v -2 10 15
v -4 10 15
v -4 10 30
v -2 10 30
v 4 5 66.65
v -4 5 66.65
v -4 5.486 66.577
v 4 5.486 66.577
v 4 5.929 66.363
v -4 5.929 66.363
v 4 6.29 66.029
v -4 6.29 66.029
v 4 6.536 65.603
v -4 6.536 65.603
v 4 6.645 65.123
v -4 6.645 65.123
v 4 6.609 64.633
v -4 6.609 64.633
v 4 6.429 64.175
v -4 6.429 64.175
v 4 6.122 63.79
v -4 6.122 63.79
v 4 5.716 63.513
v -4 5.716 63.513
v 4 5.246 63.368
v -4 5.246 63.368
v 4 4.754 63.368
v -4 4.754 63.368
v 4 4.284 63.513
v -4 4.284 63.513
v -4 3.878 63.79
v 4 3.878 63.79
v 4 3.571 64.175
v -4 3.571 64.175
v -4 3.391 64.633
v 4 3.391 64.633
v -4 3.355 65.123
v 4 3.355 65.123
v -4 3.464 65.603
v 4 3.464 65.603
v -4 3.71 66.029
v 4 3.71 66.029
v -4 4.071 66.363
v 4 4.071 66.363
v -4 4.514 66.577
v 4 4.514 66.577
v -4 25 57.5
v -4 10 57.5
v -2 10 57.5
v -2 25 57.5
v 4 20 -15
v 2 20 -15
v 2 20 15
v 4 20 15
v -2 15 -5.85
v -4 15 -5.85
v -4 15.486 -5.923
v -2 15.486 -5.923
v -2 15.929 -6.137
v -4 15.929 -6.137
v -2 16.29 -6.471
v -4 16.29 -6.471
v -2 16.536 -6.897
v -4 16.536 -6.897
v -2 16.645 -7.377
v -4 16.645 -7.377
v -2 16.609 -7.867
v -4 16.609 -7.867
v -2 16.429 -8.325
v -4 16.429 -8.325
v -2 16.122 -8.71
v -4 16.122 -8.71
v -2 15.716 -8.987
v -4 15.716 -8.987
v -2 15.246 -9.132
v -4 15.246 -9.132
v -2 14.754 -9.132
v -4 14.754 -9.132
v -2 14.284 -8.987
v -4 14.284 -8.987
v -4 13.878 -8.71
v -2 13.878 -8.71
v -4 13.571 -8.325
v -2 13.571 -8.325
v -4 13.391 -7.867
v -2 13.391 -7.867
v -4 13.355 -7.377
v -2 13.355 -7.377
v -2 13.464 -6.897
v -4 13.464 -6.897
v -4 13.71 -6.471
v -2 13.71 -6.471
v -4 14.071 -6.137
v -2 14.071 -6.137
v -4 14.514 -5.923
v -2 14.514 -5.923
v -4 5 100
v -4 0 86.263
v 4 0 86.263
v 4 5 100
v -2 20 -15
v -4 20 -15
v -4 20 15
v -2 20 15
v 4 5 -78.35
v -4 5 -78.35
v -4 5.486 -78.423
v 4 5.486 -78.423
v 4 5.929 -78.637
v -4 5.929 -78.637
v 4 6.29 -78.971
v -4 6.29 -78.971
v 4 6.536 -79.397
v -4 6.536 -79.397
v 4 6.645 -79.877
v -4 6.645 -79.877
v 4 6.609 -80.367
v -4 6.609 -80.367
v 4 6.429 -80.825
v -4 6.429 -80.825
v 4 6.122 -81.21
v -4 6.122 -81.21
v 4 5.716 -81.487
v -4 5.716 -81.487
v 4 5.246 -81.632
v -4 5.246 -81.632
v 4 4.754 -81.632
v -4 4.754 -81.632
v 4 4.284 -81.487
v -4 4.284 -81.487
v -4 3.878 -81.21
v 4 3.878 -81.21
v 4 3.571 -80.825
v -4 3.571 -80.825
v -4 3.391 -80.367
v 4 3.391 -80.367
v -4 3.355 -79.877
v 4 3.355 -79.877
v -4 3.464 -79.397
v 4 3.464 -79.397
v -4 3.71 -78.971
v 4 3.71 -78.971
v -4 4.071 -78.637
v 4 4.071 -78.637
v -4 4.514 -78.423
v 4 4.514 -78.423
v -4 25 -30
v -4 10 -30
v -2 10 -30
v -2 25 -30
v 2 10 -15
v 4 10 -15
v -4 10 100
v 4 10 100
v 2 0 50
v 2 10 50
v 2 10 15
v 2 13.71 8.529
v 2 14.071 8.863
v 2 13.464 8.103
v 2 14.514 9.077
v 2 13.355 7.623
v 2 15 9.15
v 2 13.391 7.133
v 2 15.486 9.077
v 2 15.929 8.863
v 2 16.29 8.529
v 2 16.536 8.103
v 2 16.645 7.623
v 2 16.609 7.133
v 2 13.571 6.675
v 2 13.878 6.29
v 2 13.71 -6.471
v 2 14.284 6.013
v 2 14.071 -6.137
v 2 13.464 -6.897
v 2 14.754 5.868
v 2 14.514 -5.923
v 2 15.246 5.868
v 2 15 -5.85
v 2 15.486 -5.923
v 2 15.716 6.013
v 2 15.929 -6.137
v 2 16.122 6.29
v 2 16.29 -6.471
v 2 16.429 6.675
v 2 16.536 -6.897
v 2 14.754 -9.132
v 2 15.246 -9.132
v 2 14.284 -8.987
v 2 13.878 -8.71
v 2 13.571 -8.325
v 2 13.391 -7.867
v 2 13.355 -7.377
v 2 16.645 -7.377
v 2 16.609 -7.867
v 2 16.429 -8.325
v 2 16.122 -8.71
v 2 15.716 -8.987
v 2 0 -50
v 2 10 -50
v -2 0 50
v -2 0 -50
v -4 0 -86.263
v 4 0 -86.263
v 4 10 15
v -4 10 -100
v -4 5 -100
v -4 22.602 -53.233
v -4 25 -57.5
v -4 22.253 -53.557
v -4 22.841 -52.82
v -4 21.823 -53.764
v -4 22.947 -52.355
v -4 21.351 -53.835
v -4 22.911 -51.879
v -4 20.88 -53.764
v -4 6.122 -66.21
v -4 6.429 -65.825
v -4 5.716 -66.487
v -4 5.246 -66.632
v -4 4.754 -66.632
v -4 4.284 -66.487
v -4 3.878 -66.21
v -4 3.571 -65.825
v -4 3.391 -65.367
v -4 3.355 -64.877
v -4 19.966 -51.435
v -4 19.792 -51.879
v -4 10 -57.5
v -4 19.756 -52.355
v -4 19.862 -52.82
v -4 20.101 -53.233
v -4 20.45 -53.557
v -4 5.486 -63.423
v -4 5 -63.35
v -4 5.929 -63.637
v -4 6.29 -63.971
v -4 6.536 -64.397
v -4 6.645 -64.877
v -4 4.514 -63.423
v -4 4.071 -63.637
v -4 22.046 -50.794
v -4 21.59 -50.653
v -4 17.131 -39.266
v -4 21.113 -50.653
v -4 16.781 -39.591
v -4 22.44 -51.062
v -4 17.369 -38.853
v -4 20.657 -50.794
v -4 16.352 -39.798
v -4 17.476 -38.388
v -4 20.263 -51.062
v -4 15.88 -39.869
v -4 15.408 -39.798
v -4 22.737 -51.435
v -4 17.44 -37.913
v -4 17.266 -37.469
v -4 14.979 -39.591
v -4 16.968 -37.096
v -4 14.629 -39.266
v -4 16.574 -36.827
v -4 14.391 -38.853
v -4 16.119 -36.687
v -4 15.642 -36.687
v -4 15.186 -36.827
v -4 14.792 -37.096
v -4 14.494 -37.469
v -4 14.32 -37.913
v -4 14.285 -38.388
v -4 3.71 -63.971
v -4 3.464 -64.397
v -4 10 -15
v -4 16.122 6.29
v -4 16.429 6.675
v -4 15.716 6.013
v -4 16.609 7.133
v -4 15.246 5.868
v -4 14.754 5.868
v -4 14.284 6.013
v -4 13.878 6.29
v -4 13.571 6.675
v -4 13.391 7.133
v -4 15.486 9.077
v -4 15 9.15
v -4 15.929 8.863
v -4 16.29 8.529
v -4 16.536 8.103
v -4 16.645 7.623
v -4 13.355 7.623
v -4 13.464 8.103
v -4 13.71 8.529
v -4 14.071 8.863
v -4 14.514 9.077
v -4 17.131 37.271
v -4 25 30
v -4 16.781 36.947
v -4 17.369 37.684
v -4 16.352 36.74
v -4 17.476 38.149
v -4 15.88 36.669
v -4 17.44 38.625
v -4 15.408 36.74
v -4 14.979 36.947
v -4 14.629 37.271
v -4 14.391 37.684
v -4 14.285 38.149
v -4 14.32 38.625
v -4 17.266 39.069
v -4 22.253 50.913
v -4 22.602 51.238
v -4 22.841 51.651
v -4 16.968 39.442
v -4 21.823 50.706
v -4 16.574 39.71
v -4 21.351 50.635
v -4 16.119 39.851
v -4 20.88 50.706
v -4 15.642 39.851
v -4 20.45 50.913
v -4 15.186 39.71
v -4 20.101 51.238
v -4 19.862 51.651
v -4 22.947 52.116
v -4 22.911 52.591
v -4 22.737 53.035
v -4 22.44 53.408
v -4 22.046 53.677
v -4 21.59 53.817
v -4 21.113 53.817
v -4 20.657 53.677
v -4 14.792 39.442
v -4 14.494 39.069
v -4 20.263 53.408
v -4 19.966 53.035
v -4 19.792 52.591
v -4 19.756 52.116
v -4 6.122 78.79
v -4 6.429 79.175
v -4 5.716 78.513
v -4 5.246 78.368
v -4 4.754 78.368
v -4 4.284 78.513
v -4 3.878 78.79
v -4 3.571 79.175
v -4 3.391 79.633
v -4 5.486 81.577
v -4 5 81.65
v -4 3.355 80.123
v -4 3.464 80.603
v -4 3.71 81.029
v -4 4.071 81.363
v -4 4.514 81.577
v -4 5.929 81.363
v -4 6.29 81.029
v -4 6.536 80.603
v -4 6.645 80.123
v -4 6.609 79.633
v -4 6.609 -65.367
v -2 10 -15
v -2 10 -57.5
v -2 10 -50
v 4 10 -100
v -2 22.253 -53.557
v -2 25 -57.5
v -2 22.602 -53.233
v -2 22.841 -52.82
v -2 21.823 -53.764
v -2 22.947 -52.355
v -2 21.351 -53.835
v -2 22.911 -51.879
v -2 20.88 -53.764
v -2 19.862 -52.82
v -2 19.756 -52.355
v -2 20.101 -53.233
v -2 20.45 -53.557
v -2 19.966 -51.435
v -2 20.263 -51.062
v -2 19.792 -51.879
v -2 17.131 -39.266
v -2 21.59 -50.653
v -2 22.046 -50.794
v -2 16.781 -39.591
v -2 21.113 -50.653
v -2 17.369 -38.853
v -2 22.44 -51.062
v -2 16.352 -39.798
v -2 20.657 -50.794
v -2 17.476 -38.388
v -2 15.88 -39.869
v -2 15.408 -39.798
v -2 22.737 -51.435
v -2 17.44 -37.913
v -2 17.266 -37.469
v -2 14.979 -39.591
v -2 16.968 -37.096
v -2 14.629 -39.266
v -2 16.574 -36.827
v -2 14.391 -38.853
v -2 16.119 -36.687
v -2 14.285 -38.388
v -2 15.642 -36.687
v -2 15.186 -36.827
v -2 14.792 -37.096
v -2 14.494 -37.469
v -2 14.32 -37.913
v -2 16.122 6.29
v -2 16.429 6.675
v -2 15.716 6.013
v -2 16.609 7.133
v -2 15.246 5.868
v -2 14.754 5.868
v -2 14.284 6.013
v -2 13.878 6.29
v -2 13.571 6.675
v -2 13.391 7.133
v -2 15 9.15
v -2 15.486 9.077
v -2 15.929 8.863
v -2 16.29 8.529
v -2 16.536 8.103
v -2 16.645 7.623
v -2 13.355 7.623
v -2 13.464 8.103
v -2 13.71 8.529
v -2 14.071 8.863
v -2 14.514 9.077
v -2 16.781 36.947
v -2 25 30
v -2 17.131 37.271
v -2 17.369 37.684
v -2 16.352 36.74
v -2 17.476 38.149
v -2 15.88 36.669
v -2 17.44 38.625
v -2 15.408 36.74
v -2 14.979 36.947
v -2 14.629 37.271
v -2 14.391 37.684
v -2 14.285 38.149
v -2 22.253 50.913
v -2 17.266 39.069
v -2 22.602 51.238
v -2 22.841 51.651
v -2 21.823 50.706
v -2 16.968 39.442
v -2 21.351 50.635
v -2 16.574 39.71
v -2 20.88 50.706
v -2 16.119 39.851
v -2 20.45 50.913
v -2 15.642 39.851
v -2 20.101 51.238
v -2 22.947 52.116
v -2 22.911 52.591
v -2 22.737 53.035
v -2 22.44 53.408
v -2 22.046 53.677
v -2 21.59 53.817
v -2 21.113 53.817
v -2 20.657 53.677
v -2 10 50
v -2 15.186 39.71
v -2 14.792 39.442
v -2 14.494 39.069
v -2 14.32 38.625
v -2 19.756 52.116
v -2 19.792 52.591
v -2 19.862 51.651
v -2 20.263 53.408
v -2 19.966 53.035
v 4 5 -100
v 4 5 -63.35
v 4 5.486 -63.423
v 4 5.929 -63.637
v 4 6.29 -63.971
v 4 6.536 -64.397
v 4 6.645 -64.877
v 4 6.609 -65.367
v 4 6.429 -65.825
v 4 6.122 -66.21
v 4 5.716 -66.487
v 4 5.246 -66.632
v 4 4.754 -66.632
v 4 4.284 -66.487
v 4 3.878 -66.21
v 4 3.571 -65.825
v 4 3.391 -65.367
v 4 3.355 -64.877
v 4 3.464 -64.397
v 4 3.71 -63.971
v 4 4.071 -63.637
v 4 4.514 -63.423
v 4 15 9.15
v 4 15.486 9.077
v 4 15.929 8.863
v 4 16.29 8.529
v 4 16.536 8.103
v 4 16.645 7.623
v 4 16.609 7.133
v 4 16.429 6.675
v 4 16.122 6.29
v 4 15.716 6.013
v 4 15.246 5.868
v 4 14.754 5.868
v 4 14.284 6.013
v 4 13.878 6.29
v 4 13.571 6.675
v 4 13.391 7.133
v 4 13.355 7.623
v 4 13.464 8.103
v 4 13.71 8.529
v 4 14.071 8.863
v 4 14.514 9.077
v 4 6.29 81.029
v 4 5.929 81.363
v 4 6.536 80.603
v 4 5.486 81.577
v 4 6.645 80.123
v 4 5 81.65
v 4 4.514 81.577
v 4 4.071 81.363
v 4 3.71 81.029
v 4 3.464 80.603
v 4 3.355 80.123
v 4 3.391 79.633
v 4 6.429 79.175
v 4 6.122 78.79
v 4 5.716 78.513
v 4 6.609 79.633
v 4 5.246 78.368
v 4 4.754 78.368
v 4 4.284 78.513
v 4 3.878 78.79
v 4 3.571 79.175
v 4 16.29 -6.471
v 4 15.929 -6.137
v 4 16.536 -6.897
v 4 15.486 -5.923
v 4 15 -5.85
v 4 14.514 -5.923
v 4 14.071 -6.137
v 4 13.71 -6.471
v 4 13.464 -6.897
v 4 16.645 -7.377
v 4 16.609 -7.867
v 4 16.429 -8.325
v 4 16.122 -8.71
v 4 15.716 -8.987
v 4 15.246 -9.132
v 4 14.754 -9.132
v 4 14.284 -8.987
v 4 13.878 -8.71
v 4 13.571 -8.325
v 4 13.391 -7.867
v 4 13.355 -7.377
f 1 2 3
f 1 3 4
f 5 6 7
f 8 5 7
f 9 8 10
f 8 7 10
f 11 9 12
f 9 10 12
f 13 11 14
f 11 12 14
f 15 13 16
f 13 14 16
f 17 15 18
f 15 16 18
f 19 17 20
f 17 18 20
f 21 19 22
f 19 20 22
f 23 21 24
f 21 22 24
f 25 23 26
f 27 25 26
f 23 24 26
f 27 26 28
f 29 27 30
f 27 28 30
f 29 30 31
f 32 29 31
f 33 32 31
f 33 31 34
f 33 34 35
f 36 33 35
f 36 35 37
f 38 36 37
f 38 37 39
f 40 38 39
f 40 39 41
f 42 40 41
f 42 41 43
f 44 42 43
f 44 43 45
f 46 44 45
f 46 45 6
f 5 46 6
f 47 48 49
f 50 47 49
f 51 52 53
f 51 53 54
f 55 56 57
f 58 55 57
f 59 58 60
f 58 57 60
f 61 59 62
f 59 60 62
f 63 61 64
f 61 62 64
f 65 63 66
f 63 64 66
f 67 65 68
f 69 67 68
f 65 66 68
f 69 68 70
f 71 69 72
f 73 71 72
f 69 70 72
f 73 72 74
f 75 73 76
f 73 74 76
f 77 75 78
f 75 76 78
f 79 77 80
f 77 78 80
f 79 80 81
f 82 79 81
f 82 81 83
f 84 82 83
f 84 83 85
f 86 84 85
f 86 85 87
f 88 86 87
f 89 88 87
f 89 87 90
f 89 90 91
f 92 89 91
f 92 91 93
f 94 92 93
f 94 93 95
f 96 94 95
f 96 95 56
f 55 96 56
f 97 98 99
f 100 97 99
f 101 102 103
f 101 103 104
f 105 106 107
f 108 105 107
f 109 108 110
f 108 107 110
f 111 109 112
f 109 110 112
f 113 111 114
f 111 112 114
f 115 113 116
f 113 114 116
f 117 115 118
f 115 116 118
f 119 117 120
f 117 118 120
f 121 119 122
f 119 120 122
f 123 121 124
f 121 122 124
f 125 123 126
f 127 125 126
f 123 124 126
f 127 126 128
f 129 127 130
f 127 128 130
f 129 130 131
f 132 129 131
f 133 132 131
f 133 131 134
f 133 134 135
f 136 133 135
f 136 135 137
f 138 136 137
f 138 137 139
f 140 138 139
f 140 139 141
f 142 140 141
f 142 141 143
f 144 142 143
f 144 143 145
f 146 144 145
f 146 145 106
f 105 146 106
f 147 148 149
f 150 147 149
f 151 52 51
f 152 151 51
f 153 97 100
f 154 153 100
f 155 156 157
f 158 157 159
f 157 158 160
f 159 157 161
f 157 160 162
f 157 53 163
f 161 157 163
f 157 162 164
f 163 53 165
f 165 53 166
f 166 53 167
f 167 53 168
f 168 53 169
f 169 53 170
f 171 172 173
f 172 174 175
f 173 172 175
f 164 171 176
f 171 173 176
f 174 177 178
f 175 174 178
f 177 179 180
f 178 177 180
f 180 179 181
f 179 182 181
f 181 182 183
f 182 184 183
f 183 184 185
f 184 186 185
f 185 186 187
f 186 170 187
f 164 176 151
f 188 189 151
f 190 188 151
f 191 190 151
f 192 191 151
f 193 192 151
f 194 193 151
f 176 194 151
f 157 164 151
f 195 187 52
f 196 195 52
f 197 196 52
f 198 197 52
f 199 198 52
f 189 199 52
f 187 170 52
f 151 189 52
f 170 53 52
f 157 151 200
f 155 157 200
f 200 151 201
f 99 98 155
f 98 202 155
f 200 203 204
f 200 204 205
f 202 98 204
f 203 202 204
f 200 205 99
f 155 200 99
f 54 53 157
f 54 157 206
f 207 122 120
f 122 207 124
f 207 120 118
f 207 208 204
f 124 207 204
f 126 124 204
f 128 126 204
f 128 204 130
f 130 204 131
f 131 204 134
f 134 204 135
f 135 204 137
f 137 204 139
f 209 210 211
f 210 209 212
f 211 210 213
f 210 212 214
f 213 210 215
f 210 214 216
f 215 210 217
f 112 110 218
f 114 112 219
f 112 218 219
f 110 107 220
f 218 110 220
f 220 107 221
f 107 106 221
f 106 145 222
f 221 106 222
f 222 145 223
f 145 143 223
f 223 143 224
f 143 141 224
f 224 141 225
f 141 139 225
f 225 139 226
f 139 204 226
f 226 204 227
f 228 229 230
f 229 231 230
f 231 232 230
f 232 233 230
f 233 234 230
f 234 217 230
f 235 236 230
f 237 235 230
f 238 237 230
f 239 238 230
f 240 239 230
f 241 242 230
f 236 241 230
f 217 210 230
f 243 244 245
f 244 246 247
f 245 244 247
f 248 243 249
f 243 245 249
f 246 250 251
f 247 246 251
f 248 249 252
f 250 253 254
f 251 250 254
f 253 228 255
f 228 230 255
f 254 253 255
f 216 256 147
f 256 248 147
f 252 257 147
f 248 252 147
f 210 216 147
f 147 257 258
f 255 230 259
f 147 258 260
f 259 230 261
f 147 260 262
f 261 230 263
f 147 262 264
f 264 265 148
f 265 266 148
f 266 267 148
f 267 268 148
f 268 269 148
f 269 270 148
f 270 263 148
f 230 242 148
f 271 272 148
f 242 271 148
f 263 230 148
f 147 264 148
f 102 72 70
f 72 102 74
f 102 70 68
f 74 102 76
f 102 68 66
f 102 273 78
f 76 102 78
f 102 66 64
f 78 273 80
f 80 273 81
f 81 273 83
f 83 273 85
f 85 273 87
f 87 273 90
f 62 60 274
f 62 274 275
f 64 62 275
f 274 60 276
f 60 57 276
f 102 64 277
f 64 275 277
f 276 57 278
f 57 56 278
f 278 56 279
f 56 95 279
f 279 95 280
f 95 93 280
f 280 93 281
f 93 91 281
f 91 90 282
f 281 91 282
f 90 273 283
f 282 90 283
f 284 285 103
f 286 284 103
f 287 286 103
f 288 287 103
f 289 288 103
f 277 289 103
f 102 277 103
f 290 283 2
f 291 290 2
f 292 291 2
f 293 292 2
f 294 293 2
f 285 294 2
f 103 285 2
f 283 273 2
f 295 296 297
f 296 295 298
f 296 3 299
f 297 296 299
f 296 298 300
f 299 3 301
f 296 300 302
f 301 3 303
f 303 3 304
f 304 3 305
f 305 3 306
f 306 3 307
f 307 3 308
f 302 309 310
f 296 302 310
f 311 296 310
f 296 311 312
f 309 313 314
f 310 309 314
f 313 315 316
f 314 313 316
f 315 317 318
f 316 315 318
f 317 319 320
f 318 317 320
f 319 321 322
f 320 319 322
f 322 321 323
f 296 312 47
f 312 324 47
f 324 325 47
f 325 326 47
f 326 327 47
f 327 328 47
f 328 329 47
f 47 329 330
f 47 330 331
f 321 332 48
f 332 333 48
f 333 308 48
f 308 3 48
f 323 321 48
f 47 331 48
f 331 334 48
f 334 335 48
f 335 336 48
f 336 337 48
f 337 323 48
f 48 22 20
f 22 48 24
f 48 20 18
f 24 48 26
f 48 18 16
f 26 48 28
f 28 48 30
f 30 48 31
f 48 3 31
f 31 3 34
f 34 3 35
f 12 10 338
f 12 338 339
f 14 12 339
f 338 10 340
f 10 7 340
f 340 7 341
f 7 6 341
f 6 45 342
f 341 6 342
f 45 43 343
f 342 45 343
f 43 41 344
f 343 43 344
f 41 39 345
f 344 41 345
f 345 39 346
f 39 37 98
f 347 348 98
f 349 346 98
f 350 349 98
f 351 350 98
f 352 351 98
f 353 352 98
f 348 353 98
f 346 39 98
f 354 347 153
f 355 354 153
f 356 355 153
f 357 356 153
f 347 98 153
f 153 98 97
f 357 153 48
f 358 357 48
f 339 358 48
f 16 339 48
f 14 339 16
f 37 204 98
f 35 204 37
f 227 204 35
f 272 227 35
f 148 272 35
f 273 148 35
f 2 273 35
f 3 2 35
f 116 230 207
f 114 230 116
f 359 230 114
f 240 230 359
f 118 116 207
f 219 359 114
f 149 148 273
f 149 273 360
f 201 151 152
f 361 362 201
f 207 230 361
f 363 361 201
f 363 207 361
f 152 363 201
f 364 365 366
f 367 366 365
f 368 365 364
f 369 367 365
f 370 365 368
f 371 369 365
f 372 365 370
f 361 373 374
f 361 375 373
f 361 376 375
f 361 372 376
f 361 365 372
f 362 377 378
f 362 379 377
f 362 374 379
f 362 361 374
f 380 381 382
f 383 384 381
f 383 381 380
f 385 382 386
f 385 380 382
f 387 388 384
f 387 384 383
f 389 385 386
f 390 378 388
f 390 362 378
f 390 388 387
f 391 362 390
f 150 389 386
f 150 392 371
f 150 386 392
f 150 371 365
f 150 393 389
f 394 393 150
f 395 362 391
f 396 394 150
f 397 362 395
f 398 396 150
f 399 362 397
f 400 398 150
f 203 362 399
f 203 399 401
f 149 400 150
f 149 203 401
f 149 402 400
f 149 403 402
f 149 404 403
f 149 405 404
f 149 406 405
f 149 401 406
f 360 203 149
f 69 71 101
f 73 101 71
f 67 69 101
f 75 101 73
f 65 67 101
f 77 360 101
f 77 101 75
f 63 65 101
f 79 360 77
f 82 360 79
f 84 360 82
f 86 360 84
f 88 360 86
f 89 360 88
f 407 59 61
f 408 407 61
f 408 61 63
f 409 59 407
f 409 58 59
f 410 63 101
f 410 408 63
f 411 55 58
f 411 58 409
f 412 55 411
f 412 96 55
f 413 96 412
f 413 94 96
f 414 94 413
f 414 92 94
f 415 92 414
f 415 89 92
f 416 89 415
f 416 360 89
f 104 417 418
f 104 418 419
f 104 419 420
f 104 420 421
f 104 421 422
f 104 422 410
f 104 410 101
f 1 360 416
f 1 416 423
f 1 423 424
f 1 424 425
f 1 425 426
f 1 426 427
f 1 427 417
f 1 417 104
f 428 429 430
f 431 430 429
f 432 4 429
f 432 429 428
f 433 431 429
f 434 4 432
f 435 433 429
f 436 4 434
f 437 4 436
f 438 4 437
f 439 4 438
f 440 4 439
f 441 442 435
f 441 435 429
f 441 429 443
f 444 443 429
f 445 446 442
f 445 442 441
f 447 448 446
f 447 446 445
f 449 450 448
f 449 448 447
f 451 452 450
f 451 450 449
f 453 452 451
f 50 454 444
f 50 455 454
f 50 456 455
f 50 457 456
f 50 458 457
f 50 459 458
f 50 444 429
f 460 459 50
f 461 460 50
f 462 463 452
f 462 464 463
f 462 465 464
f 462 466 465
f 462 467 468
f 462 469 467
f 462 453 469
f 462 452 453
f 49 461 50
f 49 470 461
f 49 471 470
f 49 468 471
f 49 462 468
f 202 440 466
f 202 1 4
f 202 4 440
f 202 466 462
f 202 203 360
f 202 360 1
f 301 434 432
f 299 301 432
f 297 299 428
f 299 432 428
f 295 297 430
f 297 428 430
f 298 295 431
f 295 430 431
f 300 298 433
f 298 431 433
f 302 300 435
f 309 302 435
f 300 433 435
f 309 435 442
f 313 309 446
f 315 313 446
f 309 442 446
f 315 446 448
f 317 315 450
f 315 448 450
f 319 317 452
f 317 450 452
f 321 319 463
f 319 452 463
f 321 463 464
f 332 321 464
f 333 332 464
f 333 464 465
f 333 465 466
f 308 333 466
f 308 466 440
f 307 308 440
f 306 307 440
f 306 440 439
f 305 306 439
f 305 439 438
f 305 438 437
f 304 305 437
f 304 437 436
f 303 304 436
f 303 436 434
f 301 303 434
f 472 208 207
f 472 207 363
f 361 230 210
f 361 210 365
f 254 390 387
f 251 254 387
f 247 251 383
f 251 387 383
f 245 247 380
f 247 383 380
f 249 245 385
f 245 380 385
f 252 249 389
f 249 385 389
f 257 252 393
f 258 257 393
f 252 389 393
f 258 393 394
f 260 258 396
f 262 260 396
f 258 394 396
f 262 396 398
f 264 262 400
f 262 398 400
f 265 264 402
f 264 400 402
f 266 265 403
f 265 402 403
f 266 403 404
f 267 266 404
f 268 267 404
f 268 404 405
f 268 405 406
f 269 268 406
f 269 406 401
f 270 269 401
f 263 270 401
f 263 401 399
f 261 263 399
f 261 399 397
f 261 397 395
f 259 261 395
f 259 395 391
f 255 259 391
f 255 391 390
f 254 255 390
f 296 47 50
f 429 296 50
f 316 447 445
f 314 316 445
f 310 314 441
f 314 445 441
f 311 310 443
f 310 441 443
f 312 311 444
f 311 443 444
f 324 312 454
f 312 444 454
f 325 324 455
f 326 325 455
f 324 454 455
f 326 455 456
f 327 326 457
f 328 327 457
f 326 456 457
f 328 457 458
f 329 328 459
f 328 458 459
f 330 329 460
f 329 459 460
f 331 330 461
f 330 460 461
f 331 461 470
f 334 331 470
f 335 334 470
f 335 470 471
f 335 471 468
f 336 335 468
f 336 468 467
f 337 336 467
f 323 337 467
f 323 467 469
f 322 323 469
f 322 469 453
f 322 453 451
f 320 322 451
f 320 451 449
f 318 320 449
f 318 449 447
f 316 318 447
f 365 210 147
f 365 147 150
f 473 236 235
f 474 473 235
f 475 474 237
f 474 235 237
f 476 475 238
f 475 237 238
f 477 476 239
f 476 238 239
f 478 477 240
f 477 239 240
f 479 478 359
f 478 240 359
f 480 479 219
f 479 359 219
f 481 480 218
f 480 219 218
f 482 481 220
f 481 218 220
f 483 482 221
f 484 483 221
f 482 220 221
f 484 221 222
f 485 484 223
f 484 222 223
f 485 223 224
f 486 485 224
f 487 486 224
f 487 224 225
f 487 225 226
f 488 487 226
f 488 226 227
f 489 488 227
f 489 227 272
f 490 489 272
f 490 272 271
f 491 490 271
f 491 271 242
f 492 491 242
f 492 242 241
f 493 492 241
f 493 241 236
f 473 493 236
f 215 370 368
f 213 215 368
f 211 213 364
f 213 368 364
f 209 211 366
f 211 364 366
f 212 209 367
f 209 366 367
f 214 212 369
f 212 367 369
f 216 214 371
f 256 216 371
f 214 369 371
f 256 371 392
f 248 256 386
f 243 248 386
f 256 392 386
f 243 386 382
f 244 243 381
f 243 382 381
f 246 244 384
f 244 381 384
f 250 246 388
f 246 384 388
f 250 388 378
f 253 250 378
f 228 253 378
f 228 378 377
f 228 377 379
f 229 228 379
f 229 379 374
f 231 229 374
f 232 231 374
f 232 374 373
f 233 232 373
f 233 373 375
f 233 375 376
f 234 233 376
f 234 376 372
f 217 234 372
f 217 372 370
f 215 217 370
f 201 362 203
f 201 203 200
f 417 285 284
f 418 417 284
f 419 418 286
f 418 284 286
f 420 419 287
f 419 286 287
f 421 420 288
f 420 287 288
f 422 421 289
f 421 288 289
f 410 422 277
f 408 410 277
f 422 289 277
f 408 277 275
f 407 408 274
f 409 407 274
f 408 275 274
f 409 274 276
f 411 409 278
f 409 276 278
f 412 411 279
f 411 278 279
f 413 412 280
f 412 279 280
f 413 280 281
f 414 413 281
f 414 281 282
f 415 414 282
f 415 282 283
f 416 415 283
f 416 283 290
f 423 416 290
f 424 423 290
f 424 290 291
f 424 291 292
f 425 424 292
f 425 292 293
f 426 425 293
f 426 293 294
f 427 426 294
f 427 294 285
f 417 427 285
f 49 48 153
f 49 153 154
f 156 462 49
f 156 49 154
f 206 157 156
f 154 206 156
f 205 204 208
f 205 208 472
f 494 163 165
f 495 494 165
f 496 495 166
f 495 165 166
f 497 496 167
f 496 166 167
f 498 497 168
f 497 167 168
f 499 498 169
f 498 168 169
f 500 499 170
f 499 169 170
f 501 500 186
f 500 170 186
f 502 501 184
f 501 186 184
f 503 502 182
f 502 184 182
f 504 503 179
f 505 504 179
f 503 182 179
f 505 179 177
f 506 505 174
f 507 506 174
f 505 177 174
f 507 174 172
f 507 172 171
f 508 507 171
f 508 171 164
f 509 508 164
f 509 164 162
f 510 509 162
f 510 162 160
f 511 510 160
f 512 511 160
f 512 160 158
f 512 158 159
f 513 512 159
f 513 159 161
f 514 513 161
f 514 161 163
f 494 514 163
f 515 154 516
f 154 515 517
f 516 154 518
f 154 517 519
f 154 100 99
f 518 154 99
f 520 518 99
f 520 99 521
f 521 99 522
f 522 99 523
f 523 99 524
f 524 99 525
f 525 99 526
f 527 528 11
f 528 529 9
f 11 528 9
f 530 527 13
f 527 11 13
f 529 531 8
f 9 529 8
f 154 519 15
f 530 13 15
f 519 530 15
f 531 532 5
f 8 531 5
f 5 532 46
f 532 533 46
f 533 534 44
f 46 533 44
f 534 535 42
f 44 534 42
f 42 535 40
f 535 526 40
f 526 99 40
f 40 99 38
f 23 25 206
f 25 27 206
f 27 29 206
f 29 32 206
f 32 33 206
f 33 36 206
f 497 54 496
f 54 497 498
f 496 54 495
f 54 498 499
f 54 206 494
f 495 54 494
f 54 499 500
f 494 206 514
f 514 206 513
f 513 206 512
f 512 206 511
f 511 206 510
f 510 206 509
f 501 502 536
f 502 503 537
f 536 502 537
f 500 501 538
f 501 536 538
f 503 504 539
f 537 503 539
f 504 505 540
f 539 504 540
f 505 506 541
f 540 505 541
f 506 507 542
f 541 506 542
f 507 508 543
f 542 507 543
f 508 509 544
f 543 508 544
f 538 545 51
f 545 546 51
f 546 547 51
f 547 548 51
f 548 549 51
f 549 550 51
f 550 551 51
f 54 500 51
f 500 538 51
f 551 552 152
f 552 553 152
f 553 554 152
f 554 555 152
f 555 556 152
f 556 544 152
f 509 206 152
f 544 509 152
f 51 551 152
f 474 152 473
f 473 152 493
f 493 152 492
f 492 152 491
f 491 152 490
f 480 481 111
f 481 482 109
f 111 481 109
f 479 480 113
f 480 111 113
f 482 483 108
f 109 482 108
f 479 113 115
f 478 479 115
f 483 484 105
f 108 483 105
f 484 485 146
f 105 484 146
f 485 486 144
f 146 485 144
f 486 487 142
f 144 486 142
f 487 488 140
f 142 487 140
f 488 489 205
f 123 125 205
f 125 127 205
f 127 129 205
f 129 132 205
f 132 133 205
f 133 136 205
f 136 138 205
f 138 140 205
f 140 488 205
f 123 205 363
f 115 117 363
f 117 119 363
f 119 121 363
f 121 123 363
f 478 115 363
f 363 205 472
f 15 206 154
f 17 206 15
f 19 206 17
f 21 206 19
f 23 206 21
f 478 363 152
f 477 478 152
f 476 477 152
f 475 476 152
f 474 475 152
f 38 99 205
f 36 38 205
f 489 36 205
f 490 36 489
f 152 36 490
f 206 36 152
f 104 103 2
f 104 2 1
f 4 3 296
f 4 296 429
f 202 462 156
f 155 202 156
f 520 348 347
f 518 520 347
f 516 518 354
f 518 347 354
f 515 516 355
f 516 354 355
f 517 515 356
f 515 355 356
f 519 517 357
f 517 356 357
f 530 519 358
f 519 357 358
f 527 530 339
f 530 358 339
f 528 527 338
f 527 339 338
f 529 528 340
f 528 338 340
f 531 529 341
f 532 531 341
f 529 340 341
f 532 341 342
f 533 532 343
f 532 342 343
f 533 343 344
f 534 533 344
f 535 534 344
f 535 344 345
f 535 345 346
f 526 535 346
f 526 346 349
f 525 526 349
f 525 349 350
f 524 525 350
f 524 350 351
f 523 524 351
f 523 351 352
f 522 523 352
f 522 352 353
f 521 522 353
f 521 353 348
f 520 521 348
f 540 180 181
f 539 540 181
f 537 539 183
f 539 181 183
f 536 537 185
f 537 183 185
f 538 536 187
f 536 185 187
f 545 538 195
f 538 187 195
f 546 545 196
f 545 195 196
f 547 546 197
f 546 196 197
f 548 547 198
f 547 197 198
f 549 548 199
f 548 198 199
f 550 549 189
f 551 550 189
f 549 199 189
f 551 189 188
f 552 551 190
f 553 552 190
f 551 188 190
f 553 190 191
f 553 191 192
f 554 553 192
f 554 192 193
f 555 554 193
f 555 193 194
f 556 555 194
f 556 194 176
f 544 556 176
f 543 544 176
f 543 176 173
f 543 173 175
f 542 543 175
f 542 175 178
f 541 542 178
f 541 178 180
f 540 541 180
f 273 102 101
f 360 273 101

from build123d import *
from OCP.BRepFilletAPI import BRepFilletAPI_MakeChamfer

# Parameters (mm, degrees)
SKETCH_2_W          = 8
SKETCH_2_H          = 200
EXTRUDE_1_DEPTH     = 10
SKETCH_3_W          = 2
SKETCH_3_H          = 30
EXTRUDE_2_DEPTH     = 10
SKETCH_4_R          = 1.65
CUT_EXTRUDE_1_DEPTH = 20
SKETCH_5_W          = 4
SKETCH_5_H          = 100
CUT_EXTRUDE_2_DEPTH = 20
CHAMFER_1_SIZE      = 5
CHAMFER_1_SIZE2     = 13.737387097
SKETCH_6_W          = 2
SKETCH_6_H          = 27.5
EXTRUDE_3_DEPTH     = 15
SKETCH_7_R          = 1.65
CUT_EXTRUDE_3_DEPTH = 10
SKETCH_8_R          = 1.6
CUT_EXTRUDE_4_DEPTH = 10


with BuildPart() as part:
    # 草图2 → 凸台-拉伸1 (new body)
    with BuildSketch(Plane(origin=(0, 0, 0), x_dir=(1, 0, 0), z_dir=(0, 1, 0))):
        Rectangle(SKETCH_2_W, SKETCH_2_H)
    extrude(amount=EXTRUDE_1_DEPTH)

    # 草图3 → 凸台-拉伸2 (add)
    with BuildSketch(Plane(origin=(0, 10, 0), x_dir=(1, 0, 0), z_dir=(0, 1, 0))):
        with Locations((-3, 0)):
            Rectangle(SKETCH_3_W, SKETCH_3_H)
        with Locations((3, 0)):
            Rectangle(SKETCH_3_W, SKETCH_3_H)
    extrude(amount=EXTRUDE_2_DEPTH)

    # 草图4 → 切除-拉伸1 (cut)
    with BuildSketch(Plane.ZY.offset(4)):
        with Locations((-7.5, 15)):
            Circle(SKETCH_4_R)
        with Locations((7.5, 15)):
            Circle(SKETCH_4_R)
    extrude(amount=-CUT_EXTRUDE_1_DEPTH, mode=Mode.SUBTRACT)

    # 草图5 → 切除-拉伸2 (cut)
    with BuildSketch(Plane(origin=(0, 10, 0), x_dir=(1, 0, 0), z_dir=(0, 1, 0))):
        Rectangle(SKETCH_5_W, SKETCH_5_H)
    extrude(amount=-CUT_EXTRUDE_2_DEPTH, mode=Mode.SUBTRACT)

    # 倒角1: one chamfer whose edges measure the first distance from different faces: ONE call of the kernel's chamfer builder (chamfer() names one face for all edges)
    chamfer_1_edges_1 = [part.edges().sort_by_distance(p)[0] for p in [
        (0, 0, 100),
    ]]
    chamfer_1_side_1 = [part.faces().sort_by_distance(p)[0] for p in [
        (0, 5, 100),
    ]]
    chamfer_1_edges_2 = [part.edges().sort_by_distance(p)[0] for p in [
        (0, 0, -100),
    ]]
    chamfer_1_side_2 = [part.faces().sort_by_distance(p)[0] for p in [
        (0, 5, -100),
    ]]
    chamfer_1 = BRepFilletAPI_MakeChamfer(part.part.solid().wrapped)
    for e in chamfer_1_edges_1:
        chamfer_1.Add(CHAMFER_1_SIZE, CHAMFER_1_SIZE2, e.wrapped, chamfer_1_side_1[0].wrapped)  # the first distance lies on this face
    for e in chamfer_1_edges_2:
        chamfer_1.Add(CHAMFER_1_SIZE, CHAMFER_1_SIZE2, e.wrapped, chamfer_1_side_2[0].wrapped)  # the first distance lies on this face
    add(Compound.cast(chamfer_1.Shape()), mode=Mode.REPLACE)

    # 草图6 → 凸台-拉伸3 (add)
    with BuildSketch(Plane(origin=(0, 10, 0), x_dir=(1, 0, 0), z_dir=(0, 1, 0))):
        with Locations((-3, 43.75)):
            Rectangle(SKETCH_6_W, SKETCH_6_H)
    extrude_3 = extrude(amount=EXTRUDE_3_DEPTH)

    # 镜向2: 凸台-拉伸3 across plane
    add(extrude_3.mirror(Plane.XY))

    # 草图7 → 切除-拉伸3 (cut)
    with BuildSketch(Plane.ZY.offset(4)):
        with Locations((80, 5)):
            Circle(SKETCH_7_R)
        with Locations((65, 5)):
            Circle(SKETCH_7_R)
        with Locations((-65, 5)):
            Circle(SKETCH_7_R)
        with Locations((-80, 5)):
            Circle(SKETCH_7_R)
    extrude(amount=-CUT_EXTRUDE_3_DEPTH, mode=Mode.SUBTRACT)

    # 草图8 → 切除-拉伸4 (cut)
    with BuildSketch(Plane(origin=(-2, 0, 0), x_dir=(0, 0, -1), z_dir=(1, 0, 0))):
        with Locations((-52.235249282, 21.351499314)):
            Circle(SKETCH_8_R)
        with Locations((-38.268733006, 15.880080566)):
            Circle(SKETCH_8_R)
        with Locations((38.268733006, 15.880080566)):
            Circle(SKETCH_8_R)
        with Locations((52.235249282, 21.351499314)):
            Circle(SKETCH_8_R)
    extrude(amount=-CUT_EXTRUDE_4_DEPTH, mode=Mode.SUBTRACT)


solid = part.part
